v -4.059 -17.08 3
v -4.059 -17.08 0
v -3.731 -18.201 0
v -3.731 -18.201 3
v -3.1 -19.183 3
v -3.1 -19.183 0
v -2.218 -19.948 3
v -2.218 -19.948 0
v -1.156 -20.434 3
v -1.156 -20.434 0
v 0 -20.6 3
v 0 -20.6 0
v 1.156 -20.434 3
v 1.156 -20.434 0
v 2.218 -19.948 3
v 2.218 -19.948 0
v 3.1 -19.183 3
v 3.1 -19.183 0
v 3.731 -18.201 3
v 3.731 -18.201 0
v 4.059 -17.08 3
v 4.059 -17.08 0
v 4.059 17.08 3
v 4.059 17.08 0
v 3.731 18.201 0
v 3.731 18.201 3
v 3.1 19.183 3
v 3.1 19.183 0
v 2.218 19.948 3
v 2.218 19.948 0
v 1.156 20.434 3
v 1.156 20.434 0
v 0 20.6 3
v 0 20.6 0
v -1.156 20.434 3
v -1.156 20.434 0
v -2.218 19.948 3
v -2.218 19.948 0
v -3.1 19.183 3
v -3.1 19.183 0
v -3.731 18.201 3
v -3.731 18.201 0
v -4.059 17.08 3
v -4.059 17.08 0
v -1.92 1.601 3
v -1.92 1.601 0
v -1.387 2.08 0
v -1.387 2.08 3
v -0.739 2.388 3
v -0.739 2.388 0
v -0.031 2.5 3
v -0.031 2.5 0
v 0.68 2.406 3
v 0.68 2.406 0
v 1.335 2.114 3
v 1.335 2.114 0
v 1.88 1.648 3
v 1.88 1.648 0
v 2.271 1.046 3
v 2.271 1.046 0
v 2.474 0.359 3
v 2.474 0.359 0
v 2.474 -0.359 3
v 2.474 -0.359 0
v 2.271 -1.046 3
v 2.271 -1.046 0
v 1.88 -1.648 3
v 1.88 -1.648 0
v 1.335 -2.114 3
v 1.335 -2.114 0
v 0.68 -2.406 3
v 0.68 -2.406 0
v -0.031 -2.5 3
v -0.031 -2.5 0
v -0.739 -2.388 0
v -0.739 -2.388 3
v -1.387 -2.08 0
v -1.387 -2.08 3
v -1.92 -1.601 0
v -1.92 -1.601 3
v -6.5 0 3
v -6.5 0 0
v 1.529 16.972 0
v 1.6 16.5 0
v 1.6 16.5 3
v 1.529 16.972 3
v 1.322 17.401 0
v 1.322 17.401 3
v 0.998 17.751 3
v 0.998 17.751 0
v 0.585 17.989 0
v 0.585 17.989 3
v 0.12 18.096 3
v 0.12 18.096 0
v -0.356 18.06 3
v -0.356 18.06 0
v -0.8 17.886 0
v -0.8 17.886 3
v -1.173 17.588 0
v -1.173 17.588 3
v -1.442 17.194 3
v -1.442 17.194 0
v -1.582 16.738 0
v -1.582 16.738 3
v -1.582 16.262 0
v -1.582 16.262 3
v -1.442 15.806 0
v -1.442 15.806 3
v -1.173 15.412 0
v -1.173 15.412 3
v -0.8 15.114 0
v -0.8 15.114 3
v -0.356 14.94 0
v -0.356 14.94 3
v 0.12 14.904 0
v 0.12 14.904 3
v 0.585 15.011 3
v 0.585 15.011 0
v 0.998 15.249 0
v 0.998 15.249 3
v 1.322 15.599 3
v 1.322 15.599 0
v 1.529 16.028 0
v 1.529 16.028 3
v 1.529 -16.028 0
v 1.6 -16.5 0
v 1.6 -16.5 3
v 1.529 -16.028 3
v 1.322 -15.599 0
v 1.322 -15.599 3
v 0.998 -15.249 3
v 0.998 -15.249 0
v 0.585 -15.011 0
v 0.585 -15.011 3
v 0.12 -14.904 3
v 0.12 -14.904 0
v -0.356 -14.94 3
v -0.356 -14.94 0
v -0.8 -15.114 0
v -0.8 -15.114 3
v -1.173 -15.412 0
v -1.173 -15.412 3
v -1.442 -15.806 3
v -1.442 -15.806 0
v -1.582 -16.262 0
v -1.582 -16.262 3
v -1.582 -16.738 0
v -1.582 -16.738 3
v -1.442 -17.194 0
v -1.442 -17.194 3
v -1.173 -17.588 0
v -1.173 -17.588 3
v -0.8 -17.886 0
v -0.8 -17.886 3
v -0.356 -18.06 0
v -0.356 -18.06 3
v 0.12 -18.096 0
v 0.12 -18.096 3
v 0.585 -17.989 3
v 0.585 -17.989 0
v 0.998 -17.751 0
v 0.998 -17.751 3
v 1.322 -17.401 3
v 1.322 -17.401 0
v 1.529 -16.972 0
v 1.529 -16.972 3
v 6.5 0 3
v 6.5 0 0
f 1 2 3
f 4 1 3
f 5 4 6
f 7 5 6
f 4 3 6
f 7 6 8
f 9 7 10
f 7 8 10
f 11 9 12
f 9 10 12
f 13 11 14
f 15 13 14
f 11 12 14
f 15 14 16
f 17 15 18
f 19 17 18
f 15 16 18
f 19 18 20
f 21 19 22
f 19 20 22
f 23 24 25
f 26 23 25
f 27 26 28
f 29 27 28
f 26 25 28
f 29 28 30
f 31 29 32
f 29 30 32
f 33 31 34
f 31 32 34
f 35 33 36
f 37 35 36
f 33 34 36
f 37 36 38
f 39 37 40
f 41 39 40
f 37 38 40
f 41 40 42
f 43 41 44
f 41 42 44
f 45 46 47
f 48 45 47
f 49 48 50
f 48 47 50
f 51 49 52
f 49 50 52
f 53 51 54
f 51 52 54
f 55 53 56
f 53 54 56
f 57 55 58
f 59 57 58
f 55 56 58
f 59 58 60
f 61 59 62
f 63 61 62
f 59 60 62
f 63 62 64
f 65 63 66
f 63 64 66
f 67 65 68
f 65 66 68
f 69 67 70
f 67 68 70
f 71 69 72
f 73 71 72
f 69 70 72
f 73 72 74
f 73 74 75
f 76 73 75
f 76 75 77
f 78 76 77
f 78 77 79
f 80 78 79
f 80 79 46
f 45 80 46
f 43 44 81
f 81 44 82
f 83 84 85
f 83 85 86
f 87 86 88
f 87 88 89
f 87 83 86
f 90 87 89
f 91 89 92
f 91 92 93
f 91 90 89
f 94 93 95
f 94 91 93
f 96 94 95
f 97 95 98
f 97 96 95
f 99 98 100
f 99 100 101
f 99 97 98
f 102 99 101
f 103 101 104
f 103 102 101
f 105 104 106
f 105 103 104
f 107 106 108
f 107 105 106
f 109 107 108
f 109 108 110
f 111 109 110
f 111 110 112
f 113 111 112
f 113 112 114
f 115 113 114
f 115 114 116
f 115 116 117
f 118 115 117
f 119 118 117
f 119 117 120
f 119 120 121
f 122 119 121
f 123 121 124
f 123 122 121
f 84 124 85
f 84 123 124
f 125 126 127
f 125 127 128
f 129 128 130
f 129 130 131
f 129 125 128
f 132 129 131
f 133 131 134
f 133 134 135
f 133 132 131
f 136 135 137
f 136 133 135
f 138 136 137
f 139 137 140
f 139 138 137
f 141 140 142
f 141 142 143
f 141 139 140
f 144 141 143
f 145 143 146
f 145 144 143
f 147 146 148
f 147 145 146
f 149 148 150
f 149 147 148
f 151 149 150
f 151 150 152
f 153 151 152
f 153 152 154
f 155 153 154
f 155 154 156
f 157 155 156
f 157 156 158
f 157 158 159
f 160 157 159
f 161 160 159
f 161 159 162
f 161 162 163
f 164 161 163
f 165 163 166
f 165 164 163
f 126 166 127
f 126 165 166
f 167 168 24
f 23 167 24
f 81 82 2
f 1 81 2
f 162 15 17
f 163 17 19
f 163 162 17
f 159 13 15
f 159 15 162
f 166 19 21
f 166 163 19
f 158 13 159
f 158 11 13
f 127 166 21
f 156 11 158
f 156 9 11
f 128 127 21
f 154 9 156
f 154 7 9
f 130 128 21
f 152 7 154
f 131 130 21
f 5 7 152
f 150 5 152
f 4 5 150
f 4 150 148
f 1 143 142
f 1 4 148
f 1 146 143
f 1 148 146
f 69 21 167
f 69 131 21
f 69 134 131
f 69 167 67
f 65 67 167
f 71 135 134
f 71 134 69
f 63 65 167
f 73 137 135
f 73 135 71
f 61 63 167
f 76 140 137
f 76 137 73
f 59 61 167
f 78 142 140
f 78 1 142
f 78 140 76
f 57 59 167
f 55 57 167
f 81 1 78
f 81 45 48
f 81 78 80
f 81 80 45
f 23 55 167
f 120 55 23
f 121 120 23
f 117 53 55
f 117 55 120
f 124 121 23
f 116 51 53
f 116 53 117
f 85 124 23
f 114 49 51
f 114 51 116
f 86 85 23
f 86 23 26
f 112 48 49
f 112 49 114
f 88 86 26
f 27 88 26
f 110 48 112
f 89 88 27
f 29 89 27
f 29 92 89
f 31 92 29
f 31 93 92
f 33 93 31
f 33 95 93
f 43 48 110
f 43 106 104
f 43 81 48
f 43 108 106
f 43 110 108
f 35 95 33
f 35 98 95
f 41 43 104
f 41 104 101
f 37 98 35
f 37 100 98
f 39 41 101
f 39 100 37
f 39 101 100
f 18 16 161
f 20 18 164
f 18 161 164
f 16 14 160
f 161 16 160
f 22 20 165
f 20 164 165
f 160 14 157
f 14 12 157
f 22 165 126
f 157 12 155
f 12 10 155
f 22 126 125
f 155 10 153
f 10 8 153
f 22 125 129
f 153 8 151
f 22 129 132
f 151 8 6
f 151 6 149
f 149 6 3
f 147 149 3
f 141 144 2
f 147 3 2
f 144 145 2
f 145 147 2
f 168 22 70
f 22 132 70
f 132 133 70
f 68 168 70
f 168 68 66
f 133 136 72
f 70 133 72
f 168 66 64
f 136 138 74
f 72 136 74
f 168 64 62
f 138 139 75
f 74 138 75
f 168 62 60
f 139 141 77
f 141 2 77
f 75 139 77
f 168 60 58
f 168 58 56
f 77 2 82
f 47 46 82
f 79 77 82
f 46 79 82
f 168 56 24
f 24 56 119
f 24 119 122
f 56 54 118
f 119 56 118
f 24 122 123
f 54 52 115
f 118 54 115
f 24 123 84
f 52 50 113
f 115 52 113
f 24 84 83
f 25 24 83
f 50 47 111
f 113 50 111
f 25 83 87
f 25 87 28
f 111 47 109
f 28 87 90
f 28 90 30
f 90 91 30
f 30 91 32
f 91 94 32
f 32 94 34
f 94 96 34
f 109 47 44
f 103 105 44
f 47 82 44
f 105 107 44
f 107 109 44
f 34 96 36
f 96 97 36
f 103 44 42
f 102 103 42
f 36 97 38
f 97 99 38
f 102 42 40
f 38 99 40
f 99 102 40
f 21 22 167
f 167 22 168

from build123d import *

# Parameters (mm, degrees)
CROQUIS1_R              = 1.6
SALIENTE_EXTRUIR1_DEPTH = 3


with BuildPart() as part:
    # Croquis1 → Saliente-Extruir1 (new body)
    with BuildSketch(Plane(origin=(0, 0, 0), x_dir=(0, 1, 0), z_dir=(0, 0, 1))):
        with BuildLine():
            Line((0, 6.5), (-17.080114399, 4.058751937))
            ThreePointArc((-17.080114399, 4.058751937), (-20.6, 0), (-17.080114399, -4.058751937))
            Line((-17.080114399, -4.058751937), (0, -6.5))
            Line((0, -6.5), (17.080114399, -4.058751937))
            ThreePointArc((17.080114399, -4.058751937), (20.6, 0), (17.080114399, 4.058751937))
            Line((17.080114399, 4.058751937), (0, 6.5))
        make_face()
        with BuildLine():
            Line((-1.601124605, 1.92), (1.601124605, 1.92))
            ThreePointArc((1.601124605, 1.92), (0, -2.5), (-1.601124605, 1.92))
        make_face(mode=Mode.SUBTRACT)
        with Locations(Location((-16.5, 0, 0), (0, 0, 270))):
            Circle(CROQUIS1_R, mode=Mode.SUBTRACT)
        with Locations(Location((16.5, 0, 0), (0, 0, 270))):
            Circle(CROQUIS1_R, mode=Mode.SUBTRACT)
    extrude(amount=SALIENTE_EXTRUIR1_DEPTH)


solid = part.part
